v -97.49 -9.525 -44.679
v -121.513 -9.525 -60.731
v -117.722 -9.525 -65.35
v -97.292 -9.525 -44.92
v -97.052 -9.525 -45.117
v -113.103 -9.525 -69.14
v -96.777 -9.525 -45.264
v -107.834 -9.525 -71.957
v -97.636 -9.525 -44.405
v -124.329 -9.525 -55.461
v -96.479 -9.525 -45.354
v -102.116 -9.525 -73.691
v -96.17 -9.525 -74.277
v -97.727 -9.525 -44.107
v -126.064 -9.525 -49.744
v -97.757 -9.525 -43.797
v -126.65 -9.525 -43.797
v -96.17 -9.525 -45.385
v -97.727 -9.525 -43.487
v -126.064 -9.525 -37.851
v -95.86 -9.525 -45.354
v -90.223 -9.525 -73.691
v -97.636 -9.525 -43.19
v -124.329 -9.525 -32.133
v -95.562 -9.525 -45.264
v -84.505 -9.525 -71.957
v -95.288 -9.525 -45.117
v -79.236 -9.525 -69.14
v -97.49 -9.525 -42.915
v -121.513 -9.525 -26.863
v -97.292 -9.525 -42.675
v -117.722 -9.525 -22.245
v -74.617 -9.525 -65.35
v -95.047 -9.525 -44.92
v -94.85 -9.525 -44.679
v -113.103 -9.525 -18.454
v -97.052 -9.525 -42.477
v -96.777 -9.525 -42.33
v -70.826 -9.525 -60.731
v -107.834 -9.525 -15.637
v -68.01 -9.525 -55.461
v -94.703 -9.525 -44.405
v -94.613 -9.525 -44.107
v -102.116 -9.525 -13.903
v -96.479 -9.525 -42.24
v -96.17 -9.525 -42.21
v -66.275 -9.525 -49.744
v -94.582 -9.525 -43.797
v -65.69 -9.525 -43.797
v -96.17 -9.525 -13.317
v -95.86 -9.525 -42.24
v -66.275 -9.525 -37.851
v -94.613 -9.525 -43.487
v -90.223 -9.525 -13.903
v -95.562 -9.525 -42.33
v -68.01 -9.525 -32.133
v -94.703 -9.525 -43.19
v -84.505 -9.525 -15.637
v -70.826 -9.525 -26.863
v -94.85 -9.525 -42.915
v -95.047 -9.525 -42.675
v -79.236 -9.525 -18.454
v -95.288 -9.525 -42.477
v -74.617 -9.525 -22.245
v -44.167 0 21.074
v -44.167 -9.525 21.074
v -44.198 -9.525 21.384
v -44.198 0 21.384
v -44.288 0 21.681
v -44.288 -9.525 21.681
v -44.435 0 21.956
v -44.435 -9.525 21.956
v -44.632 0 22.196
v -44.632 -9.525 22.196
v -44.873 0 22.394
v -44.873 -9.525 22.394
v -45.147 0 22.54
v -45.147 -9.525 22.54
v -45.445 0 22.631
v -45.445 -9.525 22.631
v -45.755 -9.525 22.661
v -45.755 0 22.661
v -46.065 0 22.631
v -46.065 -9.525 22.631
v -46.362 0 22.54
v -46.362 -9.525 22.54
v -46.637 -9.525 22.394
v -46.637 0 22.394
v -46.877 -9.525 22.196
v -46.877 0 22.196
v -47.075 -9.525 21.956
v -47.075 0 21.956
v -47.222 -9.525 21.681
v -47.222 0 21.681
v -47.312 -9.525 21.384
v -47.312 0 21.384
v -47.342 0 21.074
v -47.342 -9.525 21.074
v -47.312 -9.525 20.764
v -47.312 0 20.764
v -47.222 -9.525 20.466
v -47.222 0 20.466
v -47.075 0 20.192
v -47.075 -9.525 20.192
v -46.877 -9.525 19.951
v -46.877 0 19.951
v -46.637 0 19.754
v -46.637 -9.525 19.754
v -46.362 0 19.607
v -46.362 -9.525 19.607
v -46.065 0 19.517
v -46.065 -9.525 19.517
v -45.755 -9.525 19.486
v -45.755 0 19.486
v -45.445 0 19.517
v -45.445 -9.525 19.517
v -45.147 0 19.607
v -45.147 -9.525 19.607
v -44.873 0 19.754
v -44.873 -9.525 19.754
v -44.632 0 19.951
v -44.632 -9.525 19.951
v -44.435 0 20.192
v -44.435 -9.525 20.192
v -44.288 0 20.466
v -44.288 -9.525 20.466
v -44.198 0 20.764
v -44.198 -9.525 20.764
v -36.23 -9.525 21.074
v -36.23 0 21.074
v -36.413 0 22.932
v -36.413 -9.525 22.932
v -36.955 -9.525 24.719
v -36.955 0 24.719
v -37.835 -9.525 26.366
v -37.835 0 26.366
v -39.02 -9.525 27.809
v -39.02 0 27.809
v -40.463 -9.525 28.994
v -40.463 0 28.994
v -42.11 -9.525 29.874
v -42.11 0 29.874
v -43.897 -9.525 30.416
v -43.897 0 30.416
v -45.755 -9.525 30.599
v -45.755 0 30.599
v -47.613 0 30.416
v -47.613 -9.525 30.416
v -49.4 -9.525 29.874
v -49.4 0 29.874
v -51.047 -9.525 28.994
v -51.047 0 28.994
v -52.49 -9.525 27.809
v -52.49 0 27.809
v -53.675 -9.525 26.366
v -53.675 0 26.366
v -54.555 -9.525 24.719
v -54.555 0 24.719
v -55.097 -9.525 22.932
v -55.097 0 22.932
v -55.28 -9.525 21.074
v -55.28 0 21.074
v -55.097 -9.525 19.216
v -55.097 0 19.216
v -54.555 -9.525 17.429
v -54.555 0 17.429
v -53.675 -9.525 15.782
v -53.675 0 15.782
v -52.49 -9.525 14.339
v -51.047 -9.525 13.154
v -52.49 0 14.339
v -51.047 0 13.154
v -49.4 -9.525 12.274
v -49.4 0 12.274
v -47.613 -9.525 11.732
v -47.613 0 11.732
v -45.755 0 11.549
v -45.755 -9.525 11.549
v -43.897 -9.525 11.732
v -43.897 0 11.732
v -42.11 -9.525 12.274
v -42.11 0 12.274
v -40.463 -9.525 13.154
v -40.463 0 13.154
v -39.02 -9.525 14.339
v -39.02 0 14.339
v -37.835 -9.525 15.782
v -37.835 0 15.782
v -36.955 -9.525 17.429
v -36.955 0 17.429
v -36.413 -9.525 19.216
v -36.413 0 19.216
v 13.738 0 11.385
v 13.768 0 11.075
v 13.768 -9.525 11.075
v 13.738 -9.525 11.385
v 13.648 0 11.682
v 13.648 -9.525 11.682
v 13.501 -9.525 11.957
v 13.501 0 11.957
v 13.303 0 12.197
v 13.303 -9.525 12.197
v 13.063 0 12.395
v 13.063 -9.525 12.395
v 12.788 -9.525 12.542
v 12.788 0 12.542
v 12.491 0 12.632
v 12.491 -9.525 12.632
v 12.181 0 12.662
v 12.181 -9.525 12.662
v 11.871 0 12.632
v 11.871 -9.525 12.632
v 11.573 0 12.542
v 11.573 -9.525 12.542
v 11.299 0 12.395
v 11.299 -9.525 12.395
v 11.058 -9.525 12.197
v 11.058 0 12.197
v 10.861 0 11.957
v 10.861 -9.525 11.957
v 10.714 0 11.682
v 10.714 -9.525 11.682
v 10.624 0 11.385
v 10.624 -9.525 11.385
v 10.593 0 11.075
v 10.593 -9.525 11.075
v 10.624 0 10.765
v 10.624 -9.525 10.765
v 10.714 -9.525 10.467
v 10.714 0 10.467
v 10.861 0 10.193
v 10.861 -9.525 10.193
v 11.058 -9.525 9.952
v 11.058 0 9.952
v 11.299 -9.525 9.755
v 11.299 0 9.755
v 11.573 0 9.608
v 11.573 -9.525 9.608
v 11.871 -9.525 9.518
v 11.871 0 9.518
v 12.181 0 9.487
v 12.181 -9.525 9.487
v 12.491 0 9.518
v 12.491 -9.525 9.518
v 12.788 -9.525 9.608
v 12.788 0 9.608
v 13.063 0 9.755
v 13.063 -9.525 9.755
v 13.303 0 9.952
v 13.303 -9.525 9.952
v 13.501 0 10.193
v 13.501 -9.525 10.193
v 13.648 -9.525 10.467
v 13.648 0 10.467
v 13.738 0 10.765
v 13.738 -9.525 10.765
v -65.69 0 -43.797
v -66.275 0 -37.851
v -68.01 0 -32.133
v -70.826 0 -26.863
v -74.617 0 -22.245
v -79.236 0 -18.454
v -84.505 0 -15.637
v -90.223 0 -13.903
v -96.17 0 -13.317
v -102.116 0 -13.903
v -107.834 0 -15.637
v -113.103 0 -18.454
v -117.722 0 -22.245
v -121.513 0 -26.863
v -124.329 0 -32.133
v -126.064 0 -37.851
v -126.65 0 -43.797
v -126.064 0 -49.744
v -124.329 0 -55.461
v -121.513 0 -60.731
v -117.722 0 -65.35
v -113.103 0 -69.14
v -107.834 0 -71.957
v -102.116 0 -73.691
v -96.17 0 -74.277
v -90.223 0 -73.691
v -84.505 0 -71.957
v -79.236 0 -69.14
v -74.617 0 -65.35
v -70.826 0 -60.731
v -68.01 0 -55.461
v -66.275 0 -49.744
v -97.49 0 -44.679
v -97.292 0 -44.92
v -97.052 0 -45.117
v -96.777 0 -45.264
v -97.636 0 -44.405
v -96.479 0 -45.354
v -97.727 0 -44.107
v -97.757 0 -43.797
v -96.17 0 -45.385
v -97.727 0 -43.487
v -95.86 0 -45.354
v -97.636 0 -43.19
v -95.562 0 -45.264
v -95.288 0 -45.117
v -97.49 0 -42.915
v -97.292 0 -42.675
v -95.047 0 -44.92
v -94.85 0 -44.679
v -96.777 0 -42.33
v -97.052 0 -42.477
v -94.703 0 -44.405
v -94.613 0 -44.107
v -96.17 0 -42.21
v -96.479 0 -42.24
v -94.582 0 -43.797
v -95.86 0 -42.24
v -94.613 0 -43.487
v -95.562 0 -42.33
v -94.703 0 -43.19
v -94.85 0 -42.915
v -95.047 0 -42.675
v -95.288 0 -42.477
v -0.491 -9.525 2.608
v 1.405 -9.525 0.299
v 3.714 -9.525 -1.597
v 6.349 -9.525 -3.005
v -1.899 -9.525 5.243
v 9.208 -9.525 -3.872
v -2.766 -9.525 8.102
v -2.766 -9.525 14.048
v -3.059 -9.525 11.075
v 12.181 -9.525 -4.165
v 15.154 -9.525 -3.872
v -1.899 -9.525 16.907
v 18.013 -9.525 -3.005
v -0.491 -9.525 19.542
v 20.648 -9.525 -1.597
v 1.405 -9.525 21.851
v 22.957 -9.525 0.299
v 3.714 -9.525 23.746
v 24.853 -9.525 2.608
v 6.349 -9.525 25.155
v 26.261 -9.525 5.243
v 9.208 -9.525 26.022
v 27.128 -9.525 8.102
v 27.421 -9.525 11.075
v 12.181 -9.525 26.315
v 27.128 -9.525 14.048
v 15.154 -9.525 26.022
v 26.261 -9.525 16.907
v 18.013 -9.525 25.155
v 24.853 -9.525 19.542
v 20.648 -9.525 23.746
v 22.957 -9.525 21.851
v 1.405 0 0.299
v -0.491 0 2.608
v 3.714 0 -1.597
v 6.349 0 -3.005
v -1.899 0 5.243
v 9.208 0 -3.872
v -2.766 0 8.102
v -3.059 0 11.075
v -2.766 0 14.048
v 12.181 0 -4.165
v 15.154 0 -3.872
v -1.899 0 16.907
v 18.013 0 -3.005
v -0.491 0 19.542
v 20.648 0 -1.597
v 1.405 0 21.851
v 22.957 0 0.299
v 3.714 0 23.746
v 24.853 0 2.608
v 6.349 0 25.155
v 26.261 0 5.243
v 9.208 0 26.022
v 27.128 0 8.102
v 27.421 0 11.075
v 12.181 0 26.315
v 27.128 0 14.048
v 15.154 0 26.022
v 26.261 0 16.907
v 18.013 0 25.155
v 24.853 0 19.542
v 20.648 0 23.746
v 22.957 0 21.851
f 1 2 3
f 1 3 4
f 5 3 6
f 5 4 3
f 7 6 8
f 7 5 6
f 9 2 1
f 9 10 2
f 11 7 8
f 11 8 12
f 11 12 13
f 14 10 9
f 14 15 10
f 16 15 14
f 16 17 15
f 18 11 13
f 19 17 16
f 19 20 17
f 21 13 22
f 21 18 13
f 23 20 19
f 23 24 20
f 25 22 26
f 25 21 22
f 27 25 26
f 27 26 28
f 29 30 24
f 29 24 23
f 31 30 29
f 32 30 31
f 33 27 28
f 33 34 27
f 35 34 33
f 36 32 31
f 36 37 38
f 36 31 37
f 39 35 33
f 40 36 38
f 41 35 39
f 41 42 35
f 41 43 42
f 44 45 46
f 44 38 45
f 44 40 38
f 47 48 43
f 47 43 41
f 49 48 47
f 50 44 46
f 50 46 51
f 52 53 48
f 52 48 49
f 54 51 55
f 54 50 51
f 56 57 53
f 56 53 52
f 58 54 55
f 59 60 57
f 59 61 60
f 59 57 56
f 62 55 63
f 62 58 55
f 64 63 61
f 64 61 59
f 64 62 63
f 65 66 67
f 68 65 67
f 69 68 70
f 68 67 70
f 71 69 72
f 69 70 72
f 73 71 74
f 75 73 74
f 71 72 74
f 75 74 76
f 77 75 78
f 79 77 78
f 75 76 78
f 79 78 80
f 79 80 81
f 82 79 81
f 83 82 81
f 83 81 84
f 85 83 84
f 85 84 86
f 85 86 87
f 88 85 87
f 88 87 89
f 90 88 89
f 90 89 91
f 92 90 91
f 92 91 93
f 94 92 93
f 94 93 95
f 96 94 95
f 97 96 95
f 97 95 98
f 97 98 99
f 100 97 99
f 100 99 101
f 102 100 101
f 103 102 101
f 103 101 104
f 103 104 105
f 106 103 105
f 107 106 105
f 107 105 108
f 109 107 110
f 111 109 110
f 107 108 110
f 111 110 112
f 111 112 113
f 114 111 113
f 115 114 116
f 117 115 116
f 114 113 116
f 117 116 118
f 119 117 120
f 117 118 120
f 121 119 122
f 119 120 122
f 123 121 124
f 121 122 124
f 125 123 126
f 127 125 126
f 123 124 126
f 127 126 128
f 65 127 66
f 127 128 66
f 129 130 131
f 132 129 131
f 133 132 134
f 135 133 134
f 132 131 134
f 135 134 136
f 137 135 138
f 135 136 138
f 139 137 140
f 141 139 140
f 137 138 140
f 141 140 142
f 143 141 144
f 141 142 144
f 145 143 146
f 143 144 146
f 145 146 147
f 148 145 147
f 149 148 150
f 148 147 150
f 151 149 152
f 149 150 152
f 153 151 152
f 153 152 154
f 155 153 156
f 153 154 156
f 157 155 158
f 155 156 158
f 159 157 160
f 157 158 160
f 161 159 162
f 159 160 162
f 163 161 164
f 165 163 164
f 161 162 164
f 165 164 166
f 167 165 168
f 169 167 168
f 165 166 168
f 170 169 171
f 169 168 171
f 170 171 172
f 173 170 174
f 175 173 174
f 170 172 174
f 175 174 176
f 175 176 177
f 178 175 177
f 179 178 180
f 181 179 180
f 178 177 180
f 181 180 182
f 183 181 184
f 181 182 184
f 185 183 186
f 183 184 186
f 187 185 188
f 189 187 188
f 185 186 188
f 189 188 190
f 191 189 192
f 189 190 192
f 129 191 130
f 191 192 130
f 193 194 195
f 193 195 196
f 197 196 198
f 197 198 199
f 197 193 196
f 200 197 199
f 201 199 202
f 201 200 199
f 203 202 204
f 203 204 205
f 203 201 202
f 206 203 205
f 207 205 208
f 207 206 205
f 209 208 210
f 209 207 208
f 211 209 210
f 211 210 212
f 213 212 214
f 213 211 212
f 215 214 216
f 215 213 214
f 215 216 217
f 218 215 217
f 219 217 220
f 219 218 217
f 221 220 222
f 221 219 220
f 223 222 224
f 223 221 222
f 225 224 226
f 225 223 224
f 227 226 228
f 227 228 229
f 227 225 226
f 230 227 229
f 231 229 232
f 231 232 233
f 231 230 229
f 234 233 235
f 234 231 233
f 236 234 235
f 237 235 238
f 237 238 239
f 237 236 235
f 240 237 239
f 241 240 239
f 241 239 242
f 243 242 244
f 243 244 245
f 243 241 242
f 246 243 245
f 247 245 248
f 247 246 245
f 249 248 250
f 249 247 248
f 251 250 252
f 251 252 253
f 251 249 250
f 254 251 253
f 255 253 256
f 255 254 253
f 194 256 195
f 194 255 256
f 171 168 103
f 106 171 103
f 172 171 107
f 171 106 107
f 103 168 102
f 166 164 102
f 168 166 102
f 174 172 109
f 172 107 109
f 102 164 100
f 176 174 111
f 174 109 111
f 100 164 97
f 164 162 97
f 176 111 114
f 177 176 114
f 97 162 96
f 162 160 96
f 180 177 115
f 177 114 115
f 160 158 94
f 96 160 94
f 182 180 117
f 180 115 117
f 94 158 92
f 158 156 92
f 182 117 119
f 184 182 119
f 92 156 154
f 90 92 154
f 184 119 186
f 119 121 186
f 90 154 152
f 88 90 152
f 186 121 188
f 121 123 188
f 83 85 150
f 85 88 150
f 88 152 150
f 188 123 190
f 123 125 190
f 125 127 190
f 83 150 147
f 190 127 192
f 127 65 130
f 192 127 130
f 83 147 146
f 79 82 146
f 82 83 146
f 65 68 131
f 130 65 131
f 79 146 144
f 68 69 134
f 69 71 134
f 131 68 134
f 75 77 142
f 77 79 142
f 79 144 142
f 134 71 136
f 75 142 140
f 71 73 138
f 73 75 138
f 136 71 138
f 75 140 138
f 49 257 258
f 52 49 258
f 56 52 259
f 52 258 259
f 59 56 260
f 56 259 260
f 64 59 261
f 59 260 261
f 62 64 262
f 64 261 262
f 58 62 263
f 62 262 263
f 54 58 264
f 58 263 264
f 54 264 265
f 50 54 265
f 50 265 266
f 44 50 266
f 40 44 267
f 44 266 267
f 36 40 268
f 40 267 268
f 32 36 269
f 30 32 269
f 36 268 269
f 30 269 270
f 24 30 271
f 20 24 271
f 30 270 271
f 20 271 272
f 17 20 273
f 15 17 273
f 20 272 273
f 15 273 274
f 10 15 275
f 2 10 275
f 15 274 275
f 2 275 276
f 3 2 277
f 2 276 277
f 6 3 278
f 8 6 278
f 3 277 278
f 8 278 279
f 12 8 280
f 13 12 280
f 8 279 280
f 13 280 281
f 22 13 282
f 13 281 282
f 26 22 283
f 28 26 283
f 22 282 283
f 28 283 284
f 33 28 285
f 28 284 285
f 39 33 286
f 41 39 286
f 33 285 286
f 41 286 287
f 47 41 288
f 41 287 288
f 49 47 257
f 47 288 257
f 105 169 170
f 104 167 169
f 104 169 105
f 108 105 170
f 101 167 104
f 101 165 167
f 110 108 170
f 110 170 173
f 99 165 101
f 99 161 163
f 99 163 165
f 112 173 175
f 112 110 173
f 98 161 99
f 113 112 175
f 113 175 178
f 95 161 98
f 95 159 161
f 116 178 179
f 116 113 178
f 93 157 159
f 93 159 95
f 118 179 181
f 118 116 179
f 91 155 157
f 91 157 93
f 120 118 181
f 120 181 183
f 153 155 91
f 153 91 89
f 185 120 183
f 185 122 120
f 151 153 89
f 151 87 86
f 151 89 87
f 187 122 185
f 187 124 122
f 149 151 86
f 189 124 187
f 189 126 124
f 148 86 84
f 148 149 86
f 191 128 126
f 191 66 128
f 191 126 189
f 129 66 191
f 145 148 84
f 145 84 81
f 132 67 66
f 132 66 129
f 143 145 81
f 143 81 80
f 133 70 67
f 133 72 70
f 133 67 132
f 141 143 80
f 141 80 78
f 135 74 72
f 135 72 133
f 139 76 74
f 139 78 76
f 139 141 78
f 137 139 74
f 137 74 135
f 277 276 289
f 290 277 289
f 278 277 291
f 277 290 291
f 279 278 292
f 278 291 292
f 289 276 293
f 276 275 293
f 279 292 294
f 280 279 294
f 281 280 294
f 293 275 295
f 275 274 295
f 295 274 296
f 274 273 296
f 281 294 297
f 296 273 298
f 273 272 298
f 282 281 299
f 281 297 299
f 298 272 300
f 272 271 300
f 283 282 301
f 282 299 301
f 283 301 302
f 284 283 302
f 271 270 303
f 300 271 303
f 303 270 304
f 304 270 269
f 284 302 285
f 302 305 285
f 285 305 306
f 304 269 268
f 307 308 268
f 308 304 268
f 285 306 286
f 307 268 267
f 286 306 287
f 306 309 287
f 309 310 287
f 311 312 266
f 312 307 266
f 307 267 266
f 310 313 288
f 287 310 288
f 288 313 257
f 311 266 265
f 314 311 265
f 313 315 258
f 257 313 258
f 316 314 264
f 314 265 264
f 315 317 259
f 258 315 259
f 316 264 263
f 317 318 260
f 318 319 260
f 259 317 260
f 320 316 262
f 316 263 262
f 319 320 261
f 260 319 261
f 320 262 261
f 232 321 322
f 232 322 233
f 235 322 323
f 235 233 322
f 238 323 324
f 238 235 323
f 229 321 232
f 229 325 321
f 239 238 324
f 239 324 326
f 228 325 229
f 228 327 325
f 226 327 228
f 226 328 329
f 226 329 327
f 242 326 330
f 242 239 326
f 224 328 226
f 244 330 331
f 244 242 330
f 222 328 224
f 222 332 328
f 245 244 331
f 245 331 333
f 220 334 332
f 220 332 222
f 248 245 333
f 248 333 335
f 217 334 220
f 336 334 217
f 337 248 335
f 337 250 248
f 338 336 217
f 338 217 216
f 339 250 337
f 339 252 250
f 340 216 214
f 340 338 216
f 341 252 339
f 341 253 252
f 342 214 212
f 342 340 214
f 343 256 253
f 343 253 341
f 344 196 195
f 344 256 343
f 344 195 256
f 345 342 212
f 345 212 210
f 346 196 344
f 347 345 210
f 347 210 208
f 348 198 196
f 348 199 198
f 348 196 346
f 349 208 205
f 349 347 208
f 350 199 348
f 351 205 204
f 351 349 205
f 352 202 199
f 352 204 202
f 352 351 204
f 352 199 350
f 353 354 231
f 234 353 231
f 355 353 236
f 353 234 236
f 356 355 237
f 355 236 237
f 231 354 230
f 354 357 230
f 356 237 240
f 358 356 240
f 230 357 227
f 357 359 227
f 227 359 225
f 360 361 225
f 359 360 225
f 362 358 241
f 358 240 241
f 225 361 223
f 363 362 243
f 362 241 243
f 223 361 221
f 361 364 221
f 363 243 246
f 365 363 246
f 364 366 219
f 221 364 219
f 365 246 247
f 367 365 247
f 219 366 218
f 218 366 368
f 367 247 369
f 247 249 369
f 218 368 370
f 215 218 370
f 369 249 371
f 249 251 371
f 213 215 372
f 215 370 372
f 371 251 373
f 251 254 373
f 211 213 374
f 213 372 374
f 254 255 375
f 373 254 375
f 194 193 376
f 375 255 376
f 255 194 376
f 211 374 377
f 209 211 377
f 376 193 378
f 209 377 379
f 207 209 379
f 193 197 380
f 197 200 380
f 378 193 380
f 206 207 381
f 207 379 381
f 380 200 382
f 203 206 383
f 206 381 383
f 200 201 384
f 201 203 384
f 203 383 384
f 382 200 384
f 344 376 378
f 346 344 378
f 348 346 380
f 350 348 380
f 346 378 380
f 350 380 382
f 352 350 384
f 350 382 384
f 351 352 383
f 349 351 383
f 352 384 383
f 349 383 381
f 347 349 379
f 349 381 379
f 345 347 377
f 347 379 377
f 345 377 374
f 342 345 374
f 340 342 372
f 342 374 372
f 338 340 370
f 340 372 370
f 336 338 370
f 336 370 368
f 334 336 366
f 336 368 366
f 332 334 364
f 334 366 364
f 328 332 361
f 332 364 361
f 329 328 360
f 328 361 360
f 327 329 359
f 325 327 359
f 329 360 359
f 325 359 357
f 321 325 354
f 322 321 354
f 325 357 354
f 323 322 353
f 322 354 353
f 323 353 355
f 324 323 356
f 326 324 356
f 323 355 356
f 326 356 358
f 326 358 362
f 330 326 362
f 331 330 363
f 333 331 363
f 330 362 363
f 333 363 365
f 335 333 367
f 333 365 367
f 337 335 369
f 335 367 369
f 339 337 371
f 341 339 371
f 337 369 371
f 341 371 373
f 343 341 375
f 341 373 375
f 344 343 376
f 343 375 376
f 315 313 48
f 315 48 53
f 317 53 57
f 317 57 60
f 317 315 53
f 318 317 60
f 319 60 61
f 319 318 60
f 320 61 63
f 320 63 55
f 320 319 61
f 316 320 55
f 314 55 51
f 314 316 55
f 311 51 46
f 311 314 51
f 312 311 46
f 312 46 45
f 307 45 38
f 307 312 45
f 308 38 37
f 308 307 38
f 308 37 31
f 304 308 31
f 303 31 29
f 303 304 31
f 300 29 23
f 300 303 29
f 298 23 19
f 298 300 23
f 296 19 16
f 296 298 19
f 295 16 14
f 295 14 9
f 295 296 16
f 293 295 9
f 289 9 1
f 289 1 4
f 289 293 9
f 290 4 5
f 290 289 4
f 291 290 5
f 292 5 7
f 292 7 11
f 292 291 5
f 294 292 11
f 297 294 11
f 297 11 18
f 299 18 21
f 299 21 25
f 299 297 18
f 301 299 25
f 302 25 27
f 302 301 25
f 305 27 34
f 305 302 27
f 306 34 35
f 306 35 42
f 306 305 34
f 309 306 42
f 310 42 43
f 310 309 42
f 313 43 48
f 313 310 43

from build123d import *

# Parameters (mm, degrees)
F0_R     = 9.525
F1_DEPTH = 9.525
F2_R     = 15.24
F2_R_2   = 1.5875
F2_R_3   = 30.48
F3_DEPTH = 9.525
F4_R     = 1.5875
F5_DEPTH = 25.4


with BuildPart() as f1:
    # F0 (on Front) → F1 (new body)
    with BuildSketch(Plane.XZ):
        with Locations((-45.754869, 21.073818)):
            Circle(F0_R)
    extrude(amount=F1_DEPTH)

    # F4 (on face) → F5 (cut)
    with BuildSketch(Plane.XZ.offset(9.525)):
        with Locations((-45.754869, 21.073818)):
            Circle(F4_R)
    extrude(amount=-F5_DEPTH, mode=Mode.SUBTRACT)


with BuildPart() as f3:
    # F2 (on Front) → F3 (new body)
    with BuildSketch(Plane.XZ):
        with Locations((12.180932, 11.074892)):
            Circle(F2_R)
        with Locations((12.180932, 11.074892)):
            Circle(F2_R_2, mode=Mode.SUBTRACT)
        with Locations((-96.169628, -43.797147)):
            Circle(F2_R_3)
        with Locations((-96.169628, -43.797147)):
            Circle(F2_R_2, mode=Mode.SUBTRACT)
    extrude(amount=F3_DEPTH)


solid = Compound([f1.part, f3.part])
